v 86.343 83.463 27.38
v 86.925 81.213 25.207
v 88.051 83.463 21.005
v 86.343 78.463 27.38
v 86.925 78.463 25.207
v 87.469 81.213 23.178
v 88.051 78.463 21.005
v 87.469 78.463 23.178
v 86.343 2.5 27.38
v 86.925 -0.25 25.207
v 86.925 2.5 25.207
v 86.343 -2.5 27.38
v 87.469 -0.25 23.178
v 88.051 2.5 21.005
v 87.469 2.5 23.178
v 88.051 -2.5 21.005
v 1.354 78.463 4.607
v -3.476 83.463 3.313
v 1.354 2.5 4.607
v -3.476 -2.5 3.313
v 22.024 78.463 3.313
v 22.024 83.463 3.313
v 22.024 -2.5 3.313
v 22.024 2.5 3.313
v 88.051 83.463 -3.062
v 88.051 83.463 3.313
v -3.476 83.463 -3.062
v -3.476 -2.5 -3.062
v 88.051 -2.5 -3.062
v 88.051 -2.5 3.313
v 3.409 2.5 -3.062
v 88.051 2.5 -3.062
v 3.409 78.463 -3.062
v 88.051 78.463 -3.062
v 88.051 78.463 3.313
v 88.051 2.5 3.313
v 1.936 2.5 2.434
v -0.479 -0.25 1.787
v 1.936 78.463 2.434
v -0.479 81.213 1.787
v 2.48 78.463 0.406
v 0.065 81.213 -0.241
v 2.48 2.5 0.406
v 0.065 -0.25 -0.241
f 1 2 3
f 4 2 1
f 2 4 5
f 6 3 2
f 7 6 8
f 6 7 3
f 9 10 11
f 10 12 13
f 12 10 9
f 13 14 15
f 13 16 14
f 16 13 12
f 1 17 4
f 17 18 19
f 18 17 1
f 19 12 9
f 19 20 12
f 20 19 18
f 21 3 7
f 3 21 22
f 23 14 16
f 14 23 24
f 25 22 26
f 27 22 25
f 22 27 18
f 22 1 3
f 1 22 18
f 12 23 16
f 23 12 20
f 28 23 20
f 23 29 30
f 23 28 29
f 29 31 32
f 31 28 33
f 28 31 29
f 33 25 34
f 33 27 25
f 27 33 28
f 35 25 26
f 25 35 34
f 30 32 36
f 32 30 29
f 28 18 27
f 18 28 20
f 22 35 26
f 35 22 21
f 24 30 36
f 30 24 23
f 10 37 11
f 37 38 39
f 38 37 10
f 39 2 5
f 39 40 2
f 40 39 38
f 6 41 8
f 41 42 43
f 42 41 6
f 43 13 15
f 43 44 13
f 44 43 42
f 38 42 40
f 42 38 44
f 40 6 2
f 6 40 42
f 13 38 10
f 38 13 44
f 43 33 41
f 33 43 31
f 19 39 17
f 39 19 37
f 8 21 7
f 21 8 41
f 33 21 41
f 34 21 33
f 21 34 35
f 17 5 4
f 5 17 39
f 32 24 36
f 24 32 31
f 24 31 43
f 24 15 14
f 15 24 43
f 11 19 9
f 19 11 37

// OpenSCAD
pcb_size = [90.4875,80.9625,1.6];
tolerance =0.5;
case_thickness=5;
angle = 15;


module pcb(){
    
    cube(pcb_size);
}

module case(){
    difference() {
        union() {
            cube(
                pcb_size +
                [
                    case_thickness/2,
                    case_thickness,
                    case_thickness
                ]
            );

            case_feet();
        }
        
        translate([case_thickness/2,
                case_thickness/2-tolerance/2,
                case_thickness/2-tolerance/2]) 
        cube(pcb_size+[0,tolerance,tolerance]);

        translate([case_thickness,
                case_thickness,
                -500]) 
        cube(pcb_size-[case_thickness/2,case_thickness,0]+ [0,0,10000]);
    }

}

module case_feet() {
  /*
        /
       |\    /     /
       | \  /     /
       \  \/     /___
   |    \ |      
  a|     \|___________
          
          |--b-- ... ---|

  */

    top_piece_d = pcb_size.x  + case_thickness/2;

    top_piece_h = pcb_size.z + case_thickness;
    top_piece_w = pcb_size.y + case_thickness;

    a = cos(angle) * top_piece_h;
    b = cos(angle) * top_piece_d + sin(angle) * top_piece_h;
    
    difference() {
        translate([0,0,top_piece_h]) 
        rotate([0,90+angle,0]) 
        cube([a,top_piece_w,b]);
    }

}






rotate([0,-angle,0]){
    color(c = "green") 
//pcb();

translate([-case_thickness/2,-case_thickness/2,-case_thickness/2]) 
case();

}
